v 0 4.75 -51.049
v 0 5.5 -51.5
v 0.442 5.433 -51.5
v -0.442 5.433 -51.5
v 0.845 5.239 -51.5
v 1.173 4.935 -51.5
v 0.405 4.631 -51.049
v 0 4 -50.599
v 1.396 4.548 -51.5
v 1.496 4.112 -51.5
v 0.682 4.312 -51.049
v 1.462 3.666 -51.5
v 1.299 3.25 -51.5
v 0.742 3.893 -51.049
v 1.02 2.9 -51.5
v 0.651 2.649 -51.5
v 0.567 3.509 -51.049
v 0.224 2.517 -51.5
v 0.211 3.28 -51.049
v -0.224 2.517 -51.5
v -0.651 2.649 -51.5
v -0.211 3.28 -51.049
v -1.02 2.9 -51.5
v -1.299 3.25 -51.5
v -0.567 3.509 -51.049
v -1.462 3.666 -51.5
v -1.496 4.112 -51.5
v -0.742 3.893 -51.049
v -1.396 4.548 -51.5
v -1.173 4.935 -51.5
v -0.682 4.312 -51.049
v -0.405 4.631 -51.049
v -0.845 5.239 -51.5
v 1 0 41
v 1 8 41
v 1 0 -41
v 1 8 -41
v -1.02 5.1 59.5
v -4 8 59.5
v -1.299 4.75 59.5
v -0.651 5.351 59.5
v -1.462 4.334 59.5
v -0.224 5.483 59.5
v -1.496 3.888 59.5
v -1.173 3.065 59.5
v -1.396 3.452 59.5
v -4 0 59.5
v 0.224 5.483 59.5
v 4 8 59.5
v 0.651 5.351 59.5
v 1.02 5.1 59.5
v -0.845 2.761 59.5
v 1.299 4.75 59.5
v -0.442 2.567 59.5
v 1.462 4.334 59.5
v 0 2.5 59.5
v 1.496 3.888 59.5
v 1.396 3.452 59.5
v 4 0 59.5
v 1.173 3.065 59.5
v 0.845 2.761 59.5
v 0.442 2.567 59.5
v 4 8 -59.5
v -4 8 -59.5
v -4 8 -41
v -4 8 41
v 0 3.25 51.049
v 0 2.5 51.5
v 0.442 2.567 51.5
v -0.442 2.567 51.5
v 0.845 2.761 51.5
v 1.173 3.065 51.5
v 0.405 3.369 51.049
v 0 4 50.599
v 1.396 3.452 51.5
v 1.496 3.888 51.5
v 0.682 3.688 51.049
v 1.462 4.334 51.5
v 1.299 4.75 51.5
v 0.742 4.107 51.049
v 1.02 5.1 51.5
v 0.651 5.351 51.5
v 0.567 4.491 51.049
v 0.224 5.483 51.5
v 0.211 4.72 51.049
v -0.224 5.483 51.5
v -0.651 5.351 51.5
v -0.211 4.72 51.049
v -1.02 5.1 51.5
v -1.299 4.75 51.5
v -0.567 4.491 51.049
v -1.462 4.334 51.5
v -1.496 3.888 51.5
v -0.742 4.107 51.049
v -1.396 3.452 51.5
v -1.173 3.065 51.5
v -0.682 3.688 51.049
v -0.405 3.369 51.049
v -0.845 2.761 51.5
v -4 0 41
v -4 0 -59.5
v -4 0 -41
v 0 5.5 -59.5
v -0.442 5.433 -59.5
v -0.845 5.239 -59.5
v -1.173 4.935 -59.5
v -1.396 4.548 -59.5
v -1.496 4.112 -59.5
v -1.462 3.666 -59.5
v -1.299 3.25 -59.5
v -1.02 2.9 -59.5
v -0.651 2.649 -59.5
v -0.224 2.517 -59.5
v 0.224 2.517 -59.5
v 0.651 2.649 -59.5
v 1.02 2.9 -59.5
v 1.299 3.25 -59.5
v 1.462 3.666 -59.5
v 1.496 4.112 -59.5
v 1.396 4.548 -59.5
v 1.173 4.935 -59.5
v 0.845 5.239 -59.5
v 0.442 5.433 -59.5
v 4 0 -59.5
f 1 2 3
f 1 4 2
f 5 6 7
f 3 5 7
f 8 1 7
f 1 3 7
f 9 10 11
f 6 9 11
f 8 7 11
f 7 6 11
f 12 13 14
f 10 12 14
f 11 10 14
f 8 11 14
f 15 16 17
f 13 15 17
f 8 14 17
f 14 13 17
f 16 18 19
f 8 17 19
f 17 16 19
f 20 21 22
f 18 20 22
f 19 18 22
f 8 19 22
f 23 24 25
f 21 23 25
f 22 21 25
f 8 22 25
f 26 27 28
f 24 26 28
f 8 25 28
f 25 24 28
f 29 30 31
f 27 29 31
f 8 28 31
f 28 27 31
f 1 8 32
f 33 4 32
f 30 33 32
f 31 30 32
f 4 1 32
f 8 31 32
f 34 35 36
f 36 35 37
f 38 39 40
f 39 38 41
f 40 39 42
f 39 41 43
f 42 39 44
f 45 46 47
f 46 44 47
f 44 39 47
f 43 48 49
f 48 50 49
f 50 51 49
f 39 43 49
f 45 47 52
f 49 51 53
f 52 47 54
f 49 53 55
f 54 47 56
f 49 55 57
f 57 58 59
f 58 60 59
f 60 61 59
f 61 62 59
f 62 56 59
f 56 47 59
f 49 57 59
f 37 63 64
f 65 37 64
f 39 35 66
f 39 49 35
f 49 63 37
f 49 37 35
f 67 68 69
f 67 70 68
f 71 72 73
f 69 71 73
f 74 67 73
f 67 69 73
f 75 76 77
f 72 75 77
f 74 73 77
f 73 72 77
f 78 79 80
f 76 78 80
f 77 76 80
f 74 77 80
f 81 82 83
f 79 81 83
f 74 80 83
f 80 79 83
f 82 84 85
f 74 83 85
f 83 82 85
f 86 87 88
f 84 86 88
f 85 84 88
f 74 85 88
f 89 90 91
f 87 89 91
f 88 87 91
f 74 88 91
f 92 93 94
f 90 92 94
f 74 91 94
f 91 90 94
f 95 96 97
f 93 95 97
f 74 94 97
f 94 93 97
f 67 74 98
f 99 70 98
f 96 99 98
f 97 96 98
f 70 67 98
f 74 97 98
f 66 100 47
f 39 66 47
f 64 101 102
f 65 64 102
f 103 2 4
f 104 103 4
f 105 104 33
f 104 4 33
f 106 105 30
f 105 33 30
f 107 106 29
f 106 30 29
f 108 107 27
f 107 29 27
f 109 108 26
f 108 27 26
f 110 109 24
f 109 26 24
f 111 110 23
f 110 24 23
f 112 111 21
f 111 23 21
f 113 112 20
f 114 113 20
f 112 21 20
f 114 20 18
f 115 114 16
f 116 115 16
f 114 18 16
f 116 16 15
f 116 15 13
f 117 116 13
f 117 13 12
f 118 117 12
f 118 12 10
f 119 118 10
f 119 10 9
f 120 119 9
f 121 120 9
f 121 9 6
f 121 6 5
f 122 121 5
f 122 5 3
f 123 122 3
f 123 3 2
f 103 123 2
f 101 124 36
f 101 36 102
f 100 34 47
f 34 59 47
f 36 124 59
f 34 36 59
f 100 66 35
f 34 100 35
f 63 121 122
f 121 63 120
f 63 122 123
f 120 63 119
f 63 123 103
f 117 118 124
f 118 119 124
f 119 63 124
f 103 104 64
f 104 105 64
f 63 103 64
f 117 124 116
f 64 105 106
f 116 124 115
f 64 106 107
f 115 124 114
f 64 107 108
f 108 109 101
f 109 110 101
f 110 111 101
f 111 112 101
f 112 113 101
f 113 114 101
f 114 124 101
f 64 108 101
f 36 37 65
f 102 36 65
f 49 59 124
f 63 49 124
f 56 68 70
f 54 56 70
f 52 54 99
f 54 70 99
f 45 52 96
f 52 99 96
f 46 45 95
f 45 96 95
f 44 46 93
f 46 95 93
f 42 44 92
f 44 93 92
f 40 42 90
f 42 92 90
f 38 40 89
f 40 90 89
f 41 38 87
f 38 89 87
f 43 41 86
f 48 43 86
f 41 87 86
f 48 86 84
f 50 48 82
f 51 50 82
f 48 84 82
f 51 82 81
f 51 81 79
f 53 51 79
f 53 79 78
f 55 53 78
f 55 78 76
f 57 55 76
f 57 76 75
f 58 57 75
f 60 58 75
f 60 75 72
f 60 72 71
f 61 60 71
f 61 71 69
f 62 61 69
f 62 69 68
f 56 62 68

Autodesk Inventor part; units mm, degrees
ref_plane "YZ Plane" through (0, 0, 0) normal (1, 0, 0) x (0, 1, 0)
ref_plane "XZ Plane" through (0, 0, 0) normal (0, 1, 0) x (-1, 0, 0)
ref_plane "XY Plane" through (0, 0, 0) normal (0, 0, 1) x (1, 0, 0)
sketch "Sketch1" plane through (0, 0, 0) normal (0, 1, 0) x (-1, 0, 0)
  line L0 (4, 59.5) -> (-4, 59.5)
  line L1 (-4, 59.5) -> (-4, -59.5)
  line L2 (-4, -59.5) -> (4, -59.5)
  line L3 (4, -59.5) -> (4, 59.5)
  line L4 (4, 59.5) -> (-4, -59.5) construction
  line L5 (-4, 59.5) -> (4, -59.5) construction
  point P0 (0, 0)
  dimension "d0" = 8
  dimension "d1" = 119
extrude "Extrusion1" add sketch "Sketch1" along normal blind 8
sketch "Sketch2" plane through (0, 8, 0) normal (0, 1, 0) x (1, 0, 0)
  line L0 (-9, -41) -> (1, -41)
  line L1 (1, -41) -> (1, 41)
  line L2 (1, 41) -> (-9, 41)
  line L3 (-9, 41) -> (-9, -41)
  line L4 (-4, 59.5) -> (-4, -59.5) projected
  line L5 (-9, -41) -> (1, 41) construction
  line L6 (1, -41) -> (-9, 41) construction
  point P0 (0, 0)
  point P1 (-4, 0)
  dimension "d4" = 10
  dimension "d5" = 82
extrude "Extrusion2" cut sketch "Sketch2" against normal blind 8
sketch "Sketch3" plane through (-4, 0, 59.5) normal (0, 0, 1) x (1, 0, 0)
  circle A0 centre (4, 4) radius 1.5
  line L0 (0, 8) -> (8, 8) projected
  line L1 (8, 0) -> (8, 8) projected
  dimension "d8" = 3
  dimension "d31" = 4
  dimension "d32" = 4
hole "Hole1" at (0, 4, 59.5) direction (0, 0, -1) diameter 3 depth 8 tip angle 118
thread "Thread1" size "M3x0.5" class "6H" standard "ANSI Metric M Profile" full length
sketch "Sketch4" plane through (4, 0, -59.5) normal (0, 0, -1) x (-1, 0, 0)
  circle A0 centre (4, 4) radius 1.5
  line L0 (0, 8) -> (8, 8) projected
  line L1 (0, 0) -> (0, 8) projected
  dimension "d19" = 3
  dimension "d33" = 4
  dimension "d34" = 4
hole "Hole2" at (0, 4, -59.5) direction (0, 0, 1) diameter 3 depth 8 tip angle 118
thread "Thread2" size "M3x0.5" class "6H" standard "ANSI Metric M Profile" full length
properties part number "TopSupportPlate"
